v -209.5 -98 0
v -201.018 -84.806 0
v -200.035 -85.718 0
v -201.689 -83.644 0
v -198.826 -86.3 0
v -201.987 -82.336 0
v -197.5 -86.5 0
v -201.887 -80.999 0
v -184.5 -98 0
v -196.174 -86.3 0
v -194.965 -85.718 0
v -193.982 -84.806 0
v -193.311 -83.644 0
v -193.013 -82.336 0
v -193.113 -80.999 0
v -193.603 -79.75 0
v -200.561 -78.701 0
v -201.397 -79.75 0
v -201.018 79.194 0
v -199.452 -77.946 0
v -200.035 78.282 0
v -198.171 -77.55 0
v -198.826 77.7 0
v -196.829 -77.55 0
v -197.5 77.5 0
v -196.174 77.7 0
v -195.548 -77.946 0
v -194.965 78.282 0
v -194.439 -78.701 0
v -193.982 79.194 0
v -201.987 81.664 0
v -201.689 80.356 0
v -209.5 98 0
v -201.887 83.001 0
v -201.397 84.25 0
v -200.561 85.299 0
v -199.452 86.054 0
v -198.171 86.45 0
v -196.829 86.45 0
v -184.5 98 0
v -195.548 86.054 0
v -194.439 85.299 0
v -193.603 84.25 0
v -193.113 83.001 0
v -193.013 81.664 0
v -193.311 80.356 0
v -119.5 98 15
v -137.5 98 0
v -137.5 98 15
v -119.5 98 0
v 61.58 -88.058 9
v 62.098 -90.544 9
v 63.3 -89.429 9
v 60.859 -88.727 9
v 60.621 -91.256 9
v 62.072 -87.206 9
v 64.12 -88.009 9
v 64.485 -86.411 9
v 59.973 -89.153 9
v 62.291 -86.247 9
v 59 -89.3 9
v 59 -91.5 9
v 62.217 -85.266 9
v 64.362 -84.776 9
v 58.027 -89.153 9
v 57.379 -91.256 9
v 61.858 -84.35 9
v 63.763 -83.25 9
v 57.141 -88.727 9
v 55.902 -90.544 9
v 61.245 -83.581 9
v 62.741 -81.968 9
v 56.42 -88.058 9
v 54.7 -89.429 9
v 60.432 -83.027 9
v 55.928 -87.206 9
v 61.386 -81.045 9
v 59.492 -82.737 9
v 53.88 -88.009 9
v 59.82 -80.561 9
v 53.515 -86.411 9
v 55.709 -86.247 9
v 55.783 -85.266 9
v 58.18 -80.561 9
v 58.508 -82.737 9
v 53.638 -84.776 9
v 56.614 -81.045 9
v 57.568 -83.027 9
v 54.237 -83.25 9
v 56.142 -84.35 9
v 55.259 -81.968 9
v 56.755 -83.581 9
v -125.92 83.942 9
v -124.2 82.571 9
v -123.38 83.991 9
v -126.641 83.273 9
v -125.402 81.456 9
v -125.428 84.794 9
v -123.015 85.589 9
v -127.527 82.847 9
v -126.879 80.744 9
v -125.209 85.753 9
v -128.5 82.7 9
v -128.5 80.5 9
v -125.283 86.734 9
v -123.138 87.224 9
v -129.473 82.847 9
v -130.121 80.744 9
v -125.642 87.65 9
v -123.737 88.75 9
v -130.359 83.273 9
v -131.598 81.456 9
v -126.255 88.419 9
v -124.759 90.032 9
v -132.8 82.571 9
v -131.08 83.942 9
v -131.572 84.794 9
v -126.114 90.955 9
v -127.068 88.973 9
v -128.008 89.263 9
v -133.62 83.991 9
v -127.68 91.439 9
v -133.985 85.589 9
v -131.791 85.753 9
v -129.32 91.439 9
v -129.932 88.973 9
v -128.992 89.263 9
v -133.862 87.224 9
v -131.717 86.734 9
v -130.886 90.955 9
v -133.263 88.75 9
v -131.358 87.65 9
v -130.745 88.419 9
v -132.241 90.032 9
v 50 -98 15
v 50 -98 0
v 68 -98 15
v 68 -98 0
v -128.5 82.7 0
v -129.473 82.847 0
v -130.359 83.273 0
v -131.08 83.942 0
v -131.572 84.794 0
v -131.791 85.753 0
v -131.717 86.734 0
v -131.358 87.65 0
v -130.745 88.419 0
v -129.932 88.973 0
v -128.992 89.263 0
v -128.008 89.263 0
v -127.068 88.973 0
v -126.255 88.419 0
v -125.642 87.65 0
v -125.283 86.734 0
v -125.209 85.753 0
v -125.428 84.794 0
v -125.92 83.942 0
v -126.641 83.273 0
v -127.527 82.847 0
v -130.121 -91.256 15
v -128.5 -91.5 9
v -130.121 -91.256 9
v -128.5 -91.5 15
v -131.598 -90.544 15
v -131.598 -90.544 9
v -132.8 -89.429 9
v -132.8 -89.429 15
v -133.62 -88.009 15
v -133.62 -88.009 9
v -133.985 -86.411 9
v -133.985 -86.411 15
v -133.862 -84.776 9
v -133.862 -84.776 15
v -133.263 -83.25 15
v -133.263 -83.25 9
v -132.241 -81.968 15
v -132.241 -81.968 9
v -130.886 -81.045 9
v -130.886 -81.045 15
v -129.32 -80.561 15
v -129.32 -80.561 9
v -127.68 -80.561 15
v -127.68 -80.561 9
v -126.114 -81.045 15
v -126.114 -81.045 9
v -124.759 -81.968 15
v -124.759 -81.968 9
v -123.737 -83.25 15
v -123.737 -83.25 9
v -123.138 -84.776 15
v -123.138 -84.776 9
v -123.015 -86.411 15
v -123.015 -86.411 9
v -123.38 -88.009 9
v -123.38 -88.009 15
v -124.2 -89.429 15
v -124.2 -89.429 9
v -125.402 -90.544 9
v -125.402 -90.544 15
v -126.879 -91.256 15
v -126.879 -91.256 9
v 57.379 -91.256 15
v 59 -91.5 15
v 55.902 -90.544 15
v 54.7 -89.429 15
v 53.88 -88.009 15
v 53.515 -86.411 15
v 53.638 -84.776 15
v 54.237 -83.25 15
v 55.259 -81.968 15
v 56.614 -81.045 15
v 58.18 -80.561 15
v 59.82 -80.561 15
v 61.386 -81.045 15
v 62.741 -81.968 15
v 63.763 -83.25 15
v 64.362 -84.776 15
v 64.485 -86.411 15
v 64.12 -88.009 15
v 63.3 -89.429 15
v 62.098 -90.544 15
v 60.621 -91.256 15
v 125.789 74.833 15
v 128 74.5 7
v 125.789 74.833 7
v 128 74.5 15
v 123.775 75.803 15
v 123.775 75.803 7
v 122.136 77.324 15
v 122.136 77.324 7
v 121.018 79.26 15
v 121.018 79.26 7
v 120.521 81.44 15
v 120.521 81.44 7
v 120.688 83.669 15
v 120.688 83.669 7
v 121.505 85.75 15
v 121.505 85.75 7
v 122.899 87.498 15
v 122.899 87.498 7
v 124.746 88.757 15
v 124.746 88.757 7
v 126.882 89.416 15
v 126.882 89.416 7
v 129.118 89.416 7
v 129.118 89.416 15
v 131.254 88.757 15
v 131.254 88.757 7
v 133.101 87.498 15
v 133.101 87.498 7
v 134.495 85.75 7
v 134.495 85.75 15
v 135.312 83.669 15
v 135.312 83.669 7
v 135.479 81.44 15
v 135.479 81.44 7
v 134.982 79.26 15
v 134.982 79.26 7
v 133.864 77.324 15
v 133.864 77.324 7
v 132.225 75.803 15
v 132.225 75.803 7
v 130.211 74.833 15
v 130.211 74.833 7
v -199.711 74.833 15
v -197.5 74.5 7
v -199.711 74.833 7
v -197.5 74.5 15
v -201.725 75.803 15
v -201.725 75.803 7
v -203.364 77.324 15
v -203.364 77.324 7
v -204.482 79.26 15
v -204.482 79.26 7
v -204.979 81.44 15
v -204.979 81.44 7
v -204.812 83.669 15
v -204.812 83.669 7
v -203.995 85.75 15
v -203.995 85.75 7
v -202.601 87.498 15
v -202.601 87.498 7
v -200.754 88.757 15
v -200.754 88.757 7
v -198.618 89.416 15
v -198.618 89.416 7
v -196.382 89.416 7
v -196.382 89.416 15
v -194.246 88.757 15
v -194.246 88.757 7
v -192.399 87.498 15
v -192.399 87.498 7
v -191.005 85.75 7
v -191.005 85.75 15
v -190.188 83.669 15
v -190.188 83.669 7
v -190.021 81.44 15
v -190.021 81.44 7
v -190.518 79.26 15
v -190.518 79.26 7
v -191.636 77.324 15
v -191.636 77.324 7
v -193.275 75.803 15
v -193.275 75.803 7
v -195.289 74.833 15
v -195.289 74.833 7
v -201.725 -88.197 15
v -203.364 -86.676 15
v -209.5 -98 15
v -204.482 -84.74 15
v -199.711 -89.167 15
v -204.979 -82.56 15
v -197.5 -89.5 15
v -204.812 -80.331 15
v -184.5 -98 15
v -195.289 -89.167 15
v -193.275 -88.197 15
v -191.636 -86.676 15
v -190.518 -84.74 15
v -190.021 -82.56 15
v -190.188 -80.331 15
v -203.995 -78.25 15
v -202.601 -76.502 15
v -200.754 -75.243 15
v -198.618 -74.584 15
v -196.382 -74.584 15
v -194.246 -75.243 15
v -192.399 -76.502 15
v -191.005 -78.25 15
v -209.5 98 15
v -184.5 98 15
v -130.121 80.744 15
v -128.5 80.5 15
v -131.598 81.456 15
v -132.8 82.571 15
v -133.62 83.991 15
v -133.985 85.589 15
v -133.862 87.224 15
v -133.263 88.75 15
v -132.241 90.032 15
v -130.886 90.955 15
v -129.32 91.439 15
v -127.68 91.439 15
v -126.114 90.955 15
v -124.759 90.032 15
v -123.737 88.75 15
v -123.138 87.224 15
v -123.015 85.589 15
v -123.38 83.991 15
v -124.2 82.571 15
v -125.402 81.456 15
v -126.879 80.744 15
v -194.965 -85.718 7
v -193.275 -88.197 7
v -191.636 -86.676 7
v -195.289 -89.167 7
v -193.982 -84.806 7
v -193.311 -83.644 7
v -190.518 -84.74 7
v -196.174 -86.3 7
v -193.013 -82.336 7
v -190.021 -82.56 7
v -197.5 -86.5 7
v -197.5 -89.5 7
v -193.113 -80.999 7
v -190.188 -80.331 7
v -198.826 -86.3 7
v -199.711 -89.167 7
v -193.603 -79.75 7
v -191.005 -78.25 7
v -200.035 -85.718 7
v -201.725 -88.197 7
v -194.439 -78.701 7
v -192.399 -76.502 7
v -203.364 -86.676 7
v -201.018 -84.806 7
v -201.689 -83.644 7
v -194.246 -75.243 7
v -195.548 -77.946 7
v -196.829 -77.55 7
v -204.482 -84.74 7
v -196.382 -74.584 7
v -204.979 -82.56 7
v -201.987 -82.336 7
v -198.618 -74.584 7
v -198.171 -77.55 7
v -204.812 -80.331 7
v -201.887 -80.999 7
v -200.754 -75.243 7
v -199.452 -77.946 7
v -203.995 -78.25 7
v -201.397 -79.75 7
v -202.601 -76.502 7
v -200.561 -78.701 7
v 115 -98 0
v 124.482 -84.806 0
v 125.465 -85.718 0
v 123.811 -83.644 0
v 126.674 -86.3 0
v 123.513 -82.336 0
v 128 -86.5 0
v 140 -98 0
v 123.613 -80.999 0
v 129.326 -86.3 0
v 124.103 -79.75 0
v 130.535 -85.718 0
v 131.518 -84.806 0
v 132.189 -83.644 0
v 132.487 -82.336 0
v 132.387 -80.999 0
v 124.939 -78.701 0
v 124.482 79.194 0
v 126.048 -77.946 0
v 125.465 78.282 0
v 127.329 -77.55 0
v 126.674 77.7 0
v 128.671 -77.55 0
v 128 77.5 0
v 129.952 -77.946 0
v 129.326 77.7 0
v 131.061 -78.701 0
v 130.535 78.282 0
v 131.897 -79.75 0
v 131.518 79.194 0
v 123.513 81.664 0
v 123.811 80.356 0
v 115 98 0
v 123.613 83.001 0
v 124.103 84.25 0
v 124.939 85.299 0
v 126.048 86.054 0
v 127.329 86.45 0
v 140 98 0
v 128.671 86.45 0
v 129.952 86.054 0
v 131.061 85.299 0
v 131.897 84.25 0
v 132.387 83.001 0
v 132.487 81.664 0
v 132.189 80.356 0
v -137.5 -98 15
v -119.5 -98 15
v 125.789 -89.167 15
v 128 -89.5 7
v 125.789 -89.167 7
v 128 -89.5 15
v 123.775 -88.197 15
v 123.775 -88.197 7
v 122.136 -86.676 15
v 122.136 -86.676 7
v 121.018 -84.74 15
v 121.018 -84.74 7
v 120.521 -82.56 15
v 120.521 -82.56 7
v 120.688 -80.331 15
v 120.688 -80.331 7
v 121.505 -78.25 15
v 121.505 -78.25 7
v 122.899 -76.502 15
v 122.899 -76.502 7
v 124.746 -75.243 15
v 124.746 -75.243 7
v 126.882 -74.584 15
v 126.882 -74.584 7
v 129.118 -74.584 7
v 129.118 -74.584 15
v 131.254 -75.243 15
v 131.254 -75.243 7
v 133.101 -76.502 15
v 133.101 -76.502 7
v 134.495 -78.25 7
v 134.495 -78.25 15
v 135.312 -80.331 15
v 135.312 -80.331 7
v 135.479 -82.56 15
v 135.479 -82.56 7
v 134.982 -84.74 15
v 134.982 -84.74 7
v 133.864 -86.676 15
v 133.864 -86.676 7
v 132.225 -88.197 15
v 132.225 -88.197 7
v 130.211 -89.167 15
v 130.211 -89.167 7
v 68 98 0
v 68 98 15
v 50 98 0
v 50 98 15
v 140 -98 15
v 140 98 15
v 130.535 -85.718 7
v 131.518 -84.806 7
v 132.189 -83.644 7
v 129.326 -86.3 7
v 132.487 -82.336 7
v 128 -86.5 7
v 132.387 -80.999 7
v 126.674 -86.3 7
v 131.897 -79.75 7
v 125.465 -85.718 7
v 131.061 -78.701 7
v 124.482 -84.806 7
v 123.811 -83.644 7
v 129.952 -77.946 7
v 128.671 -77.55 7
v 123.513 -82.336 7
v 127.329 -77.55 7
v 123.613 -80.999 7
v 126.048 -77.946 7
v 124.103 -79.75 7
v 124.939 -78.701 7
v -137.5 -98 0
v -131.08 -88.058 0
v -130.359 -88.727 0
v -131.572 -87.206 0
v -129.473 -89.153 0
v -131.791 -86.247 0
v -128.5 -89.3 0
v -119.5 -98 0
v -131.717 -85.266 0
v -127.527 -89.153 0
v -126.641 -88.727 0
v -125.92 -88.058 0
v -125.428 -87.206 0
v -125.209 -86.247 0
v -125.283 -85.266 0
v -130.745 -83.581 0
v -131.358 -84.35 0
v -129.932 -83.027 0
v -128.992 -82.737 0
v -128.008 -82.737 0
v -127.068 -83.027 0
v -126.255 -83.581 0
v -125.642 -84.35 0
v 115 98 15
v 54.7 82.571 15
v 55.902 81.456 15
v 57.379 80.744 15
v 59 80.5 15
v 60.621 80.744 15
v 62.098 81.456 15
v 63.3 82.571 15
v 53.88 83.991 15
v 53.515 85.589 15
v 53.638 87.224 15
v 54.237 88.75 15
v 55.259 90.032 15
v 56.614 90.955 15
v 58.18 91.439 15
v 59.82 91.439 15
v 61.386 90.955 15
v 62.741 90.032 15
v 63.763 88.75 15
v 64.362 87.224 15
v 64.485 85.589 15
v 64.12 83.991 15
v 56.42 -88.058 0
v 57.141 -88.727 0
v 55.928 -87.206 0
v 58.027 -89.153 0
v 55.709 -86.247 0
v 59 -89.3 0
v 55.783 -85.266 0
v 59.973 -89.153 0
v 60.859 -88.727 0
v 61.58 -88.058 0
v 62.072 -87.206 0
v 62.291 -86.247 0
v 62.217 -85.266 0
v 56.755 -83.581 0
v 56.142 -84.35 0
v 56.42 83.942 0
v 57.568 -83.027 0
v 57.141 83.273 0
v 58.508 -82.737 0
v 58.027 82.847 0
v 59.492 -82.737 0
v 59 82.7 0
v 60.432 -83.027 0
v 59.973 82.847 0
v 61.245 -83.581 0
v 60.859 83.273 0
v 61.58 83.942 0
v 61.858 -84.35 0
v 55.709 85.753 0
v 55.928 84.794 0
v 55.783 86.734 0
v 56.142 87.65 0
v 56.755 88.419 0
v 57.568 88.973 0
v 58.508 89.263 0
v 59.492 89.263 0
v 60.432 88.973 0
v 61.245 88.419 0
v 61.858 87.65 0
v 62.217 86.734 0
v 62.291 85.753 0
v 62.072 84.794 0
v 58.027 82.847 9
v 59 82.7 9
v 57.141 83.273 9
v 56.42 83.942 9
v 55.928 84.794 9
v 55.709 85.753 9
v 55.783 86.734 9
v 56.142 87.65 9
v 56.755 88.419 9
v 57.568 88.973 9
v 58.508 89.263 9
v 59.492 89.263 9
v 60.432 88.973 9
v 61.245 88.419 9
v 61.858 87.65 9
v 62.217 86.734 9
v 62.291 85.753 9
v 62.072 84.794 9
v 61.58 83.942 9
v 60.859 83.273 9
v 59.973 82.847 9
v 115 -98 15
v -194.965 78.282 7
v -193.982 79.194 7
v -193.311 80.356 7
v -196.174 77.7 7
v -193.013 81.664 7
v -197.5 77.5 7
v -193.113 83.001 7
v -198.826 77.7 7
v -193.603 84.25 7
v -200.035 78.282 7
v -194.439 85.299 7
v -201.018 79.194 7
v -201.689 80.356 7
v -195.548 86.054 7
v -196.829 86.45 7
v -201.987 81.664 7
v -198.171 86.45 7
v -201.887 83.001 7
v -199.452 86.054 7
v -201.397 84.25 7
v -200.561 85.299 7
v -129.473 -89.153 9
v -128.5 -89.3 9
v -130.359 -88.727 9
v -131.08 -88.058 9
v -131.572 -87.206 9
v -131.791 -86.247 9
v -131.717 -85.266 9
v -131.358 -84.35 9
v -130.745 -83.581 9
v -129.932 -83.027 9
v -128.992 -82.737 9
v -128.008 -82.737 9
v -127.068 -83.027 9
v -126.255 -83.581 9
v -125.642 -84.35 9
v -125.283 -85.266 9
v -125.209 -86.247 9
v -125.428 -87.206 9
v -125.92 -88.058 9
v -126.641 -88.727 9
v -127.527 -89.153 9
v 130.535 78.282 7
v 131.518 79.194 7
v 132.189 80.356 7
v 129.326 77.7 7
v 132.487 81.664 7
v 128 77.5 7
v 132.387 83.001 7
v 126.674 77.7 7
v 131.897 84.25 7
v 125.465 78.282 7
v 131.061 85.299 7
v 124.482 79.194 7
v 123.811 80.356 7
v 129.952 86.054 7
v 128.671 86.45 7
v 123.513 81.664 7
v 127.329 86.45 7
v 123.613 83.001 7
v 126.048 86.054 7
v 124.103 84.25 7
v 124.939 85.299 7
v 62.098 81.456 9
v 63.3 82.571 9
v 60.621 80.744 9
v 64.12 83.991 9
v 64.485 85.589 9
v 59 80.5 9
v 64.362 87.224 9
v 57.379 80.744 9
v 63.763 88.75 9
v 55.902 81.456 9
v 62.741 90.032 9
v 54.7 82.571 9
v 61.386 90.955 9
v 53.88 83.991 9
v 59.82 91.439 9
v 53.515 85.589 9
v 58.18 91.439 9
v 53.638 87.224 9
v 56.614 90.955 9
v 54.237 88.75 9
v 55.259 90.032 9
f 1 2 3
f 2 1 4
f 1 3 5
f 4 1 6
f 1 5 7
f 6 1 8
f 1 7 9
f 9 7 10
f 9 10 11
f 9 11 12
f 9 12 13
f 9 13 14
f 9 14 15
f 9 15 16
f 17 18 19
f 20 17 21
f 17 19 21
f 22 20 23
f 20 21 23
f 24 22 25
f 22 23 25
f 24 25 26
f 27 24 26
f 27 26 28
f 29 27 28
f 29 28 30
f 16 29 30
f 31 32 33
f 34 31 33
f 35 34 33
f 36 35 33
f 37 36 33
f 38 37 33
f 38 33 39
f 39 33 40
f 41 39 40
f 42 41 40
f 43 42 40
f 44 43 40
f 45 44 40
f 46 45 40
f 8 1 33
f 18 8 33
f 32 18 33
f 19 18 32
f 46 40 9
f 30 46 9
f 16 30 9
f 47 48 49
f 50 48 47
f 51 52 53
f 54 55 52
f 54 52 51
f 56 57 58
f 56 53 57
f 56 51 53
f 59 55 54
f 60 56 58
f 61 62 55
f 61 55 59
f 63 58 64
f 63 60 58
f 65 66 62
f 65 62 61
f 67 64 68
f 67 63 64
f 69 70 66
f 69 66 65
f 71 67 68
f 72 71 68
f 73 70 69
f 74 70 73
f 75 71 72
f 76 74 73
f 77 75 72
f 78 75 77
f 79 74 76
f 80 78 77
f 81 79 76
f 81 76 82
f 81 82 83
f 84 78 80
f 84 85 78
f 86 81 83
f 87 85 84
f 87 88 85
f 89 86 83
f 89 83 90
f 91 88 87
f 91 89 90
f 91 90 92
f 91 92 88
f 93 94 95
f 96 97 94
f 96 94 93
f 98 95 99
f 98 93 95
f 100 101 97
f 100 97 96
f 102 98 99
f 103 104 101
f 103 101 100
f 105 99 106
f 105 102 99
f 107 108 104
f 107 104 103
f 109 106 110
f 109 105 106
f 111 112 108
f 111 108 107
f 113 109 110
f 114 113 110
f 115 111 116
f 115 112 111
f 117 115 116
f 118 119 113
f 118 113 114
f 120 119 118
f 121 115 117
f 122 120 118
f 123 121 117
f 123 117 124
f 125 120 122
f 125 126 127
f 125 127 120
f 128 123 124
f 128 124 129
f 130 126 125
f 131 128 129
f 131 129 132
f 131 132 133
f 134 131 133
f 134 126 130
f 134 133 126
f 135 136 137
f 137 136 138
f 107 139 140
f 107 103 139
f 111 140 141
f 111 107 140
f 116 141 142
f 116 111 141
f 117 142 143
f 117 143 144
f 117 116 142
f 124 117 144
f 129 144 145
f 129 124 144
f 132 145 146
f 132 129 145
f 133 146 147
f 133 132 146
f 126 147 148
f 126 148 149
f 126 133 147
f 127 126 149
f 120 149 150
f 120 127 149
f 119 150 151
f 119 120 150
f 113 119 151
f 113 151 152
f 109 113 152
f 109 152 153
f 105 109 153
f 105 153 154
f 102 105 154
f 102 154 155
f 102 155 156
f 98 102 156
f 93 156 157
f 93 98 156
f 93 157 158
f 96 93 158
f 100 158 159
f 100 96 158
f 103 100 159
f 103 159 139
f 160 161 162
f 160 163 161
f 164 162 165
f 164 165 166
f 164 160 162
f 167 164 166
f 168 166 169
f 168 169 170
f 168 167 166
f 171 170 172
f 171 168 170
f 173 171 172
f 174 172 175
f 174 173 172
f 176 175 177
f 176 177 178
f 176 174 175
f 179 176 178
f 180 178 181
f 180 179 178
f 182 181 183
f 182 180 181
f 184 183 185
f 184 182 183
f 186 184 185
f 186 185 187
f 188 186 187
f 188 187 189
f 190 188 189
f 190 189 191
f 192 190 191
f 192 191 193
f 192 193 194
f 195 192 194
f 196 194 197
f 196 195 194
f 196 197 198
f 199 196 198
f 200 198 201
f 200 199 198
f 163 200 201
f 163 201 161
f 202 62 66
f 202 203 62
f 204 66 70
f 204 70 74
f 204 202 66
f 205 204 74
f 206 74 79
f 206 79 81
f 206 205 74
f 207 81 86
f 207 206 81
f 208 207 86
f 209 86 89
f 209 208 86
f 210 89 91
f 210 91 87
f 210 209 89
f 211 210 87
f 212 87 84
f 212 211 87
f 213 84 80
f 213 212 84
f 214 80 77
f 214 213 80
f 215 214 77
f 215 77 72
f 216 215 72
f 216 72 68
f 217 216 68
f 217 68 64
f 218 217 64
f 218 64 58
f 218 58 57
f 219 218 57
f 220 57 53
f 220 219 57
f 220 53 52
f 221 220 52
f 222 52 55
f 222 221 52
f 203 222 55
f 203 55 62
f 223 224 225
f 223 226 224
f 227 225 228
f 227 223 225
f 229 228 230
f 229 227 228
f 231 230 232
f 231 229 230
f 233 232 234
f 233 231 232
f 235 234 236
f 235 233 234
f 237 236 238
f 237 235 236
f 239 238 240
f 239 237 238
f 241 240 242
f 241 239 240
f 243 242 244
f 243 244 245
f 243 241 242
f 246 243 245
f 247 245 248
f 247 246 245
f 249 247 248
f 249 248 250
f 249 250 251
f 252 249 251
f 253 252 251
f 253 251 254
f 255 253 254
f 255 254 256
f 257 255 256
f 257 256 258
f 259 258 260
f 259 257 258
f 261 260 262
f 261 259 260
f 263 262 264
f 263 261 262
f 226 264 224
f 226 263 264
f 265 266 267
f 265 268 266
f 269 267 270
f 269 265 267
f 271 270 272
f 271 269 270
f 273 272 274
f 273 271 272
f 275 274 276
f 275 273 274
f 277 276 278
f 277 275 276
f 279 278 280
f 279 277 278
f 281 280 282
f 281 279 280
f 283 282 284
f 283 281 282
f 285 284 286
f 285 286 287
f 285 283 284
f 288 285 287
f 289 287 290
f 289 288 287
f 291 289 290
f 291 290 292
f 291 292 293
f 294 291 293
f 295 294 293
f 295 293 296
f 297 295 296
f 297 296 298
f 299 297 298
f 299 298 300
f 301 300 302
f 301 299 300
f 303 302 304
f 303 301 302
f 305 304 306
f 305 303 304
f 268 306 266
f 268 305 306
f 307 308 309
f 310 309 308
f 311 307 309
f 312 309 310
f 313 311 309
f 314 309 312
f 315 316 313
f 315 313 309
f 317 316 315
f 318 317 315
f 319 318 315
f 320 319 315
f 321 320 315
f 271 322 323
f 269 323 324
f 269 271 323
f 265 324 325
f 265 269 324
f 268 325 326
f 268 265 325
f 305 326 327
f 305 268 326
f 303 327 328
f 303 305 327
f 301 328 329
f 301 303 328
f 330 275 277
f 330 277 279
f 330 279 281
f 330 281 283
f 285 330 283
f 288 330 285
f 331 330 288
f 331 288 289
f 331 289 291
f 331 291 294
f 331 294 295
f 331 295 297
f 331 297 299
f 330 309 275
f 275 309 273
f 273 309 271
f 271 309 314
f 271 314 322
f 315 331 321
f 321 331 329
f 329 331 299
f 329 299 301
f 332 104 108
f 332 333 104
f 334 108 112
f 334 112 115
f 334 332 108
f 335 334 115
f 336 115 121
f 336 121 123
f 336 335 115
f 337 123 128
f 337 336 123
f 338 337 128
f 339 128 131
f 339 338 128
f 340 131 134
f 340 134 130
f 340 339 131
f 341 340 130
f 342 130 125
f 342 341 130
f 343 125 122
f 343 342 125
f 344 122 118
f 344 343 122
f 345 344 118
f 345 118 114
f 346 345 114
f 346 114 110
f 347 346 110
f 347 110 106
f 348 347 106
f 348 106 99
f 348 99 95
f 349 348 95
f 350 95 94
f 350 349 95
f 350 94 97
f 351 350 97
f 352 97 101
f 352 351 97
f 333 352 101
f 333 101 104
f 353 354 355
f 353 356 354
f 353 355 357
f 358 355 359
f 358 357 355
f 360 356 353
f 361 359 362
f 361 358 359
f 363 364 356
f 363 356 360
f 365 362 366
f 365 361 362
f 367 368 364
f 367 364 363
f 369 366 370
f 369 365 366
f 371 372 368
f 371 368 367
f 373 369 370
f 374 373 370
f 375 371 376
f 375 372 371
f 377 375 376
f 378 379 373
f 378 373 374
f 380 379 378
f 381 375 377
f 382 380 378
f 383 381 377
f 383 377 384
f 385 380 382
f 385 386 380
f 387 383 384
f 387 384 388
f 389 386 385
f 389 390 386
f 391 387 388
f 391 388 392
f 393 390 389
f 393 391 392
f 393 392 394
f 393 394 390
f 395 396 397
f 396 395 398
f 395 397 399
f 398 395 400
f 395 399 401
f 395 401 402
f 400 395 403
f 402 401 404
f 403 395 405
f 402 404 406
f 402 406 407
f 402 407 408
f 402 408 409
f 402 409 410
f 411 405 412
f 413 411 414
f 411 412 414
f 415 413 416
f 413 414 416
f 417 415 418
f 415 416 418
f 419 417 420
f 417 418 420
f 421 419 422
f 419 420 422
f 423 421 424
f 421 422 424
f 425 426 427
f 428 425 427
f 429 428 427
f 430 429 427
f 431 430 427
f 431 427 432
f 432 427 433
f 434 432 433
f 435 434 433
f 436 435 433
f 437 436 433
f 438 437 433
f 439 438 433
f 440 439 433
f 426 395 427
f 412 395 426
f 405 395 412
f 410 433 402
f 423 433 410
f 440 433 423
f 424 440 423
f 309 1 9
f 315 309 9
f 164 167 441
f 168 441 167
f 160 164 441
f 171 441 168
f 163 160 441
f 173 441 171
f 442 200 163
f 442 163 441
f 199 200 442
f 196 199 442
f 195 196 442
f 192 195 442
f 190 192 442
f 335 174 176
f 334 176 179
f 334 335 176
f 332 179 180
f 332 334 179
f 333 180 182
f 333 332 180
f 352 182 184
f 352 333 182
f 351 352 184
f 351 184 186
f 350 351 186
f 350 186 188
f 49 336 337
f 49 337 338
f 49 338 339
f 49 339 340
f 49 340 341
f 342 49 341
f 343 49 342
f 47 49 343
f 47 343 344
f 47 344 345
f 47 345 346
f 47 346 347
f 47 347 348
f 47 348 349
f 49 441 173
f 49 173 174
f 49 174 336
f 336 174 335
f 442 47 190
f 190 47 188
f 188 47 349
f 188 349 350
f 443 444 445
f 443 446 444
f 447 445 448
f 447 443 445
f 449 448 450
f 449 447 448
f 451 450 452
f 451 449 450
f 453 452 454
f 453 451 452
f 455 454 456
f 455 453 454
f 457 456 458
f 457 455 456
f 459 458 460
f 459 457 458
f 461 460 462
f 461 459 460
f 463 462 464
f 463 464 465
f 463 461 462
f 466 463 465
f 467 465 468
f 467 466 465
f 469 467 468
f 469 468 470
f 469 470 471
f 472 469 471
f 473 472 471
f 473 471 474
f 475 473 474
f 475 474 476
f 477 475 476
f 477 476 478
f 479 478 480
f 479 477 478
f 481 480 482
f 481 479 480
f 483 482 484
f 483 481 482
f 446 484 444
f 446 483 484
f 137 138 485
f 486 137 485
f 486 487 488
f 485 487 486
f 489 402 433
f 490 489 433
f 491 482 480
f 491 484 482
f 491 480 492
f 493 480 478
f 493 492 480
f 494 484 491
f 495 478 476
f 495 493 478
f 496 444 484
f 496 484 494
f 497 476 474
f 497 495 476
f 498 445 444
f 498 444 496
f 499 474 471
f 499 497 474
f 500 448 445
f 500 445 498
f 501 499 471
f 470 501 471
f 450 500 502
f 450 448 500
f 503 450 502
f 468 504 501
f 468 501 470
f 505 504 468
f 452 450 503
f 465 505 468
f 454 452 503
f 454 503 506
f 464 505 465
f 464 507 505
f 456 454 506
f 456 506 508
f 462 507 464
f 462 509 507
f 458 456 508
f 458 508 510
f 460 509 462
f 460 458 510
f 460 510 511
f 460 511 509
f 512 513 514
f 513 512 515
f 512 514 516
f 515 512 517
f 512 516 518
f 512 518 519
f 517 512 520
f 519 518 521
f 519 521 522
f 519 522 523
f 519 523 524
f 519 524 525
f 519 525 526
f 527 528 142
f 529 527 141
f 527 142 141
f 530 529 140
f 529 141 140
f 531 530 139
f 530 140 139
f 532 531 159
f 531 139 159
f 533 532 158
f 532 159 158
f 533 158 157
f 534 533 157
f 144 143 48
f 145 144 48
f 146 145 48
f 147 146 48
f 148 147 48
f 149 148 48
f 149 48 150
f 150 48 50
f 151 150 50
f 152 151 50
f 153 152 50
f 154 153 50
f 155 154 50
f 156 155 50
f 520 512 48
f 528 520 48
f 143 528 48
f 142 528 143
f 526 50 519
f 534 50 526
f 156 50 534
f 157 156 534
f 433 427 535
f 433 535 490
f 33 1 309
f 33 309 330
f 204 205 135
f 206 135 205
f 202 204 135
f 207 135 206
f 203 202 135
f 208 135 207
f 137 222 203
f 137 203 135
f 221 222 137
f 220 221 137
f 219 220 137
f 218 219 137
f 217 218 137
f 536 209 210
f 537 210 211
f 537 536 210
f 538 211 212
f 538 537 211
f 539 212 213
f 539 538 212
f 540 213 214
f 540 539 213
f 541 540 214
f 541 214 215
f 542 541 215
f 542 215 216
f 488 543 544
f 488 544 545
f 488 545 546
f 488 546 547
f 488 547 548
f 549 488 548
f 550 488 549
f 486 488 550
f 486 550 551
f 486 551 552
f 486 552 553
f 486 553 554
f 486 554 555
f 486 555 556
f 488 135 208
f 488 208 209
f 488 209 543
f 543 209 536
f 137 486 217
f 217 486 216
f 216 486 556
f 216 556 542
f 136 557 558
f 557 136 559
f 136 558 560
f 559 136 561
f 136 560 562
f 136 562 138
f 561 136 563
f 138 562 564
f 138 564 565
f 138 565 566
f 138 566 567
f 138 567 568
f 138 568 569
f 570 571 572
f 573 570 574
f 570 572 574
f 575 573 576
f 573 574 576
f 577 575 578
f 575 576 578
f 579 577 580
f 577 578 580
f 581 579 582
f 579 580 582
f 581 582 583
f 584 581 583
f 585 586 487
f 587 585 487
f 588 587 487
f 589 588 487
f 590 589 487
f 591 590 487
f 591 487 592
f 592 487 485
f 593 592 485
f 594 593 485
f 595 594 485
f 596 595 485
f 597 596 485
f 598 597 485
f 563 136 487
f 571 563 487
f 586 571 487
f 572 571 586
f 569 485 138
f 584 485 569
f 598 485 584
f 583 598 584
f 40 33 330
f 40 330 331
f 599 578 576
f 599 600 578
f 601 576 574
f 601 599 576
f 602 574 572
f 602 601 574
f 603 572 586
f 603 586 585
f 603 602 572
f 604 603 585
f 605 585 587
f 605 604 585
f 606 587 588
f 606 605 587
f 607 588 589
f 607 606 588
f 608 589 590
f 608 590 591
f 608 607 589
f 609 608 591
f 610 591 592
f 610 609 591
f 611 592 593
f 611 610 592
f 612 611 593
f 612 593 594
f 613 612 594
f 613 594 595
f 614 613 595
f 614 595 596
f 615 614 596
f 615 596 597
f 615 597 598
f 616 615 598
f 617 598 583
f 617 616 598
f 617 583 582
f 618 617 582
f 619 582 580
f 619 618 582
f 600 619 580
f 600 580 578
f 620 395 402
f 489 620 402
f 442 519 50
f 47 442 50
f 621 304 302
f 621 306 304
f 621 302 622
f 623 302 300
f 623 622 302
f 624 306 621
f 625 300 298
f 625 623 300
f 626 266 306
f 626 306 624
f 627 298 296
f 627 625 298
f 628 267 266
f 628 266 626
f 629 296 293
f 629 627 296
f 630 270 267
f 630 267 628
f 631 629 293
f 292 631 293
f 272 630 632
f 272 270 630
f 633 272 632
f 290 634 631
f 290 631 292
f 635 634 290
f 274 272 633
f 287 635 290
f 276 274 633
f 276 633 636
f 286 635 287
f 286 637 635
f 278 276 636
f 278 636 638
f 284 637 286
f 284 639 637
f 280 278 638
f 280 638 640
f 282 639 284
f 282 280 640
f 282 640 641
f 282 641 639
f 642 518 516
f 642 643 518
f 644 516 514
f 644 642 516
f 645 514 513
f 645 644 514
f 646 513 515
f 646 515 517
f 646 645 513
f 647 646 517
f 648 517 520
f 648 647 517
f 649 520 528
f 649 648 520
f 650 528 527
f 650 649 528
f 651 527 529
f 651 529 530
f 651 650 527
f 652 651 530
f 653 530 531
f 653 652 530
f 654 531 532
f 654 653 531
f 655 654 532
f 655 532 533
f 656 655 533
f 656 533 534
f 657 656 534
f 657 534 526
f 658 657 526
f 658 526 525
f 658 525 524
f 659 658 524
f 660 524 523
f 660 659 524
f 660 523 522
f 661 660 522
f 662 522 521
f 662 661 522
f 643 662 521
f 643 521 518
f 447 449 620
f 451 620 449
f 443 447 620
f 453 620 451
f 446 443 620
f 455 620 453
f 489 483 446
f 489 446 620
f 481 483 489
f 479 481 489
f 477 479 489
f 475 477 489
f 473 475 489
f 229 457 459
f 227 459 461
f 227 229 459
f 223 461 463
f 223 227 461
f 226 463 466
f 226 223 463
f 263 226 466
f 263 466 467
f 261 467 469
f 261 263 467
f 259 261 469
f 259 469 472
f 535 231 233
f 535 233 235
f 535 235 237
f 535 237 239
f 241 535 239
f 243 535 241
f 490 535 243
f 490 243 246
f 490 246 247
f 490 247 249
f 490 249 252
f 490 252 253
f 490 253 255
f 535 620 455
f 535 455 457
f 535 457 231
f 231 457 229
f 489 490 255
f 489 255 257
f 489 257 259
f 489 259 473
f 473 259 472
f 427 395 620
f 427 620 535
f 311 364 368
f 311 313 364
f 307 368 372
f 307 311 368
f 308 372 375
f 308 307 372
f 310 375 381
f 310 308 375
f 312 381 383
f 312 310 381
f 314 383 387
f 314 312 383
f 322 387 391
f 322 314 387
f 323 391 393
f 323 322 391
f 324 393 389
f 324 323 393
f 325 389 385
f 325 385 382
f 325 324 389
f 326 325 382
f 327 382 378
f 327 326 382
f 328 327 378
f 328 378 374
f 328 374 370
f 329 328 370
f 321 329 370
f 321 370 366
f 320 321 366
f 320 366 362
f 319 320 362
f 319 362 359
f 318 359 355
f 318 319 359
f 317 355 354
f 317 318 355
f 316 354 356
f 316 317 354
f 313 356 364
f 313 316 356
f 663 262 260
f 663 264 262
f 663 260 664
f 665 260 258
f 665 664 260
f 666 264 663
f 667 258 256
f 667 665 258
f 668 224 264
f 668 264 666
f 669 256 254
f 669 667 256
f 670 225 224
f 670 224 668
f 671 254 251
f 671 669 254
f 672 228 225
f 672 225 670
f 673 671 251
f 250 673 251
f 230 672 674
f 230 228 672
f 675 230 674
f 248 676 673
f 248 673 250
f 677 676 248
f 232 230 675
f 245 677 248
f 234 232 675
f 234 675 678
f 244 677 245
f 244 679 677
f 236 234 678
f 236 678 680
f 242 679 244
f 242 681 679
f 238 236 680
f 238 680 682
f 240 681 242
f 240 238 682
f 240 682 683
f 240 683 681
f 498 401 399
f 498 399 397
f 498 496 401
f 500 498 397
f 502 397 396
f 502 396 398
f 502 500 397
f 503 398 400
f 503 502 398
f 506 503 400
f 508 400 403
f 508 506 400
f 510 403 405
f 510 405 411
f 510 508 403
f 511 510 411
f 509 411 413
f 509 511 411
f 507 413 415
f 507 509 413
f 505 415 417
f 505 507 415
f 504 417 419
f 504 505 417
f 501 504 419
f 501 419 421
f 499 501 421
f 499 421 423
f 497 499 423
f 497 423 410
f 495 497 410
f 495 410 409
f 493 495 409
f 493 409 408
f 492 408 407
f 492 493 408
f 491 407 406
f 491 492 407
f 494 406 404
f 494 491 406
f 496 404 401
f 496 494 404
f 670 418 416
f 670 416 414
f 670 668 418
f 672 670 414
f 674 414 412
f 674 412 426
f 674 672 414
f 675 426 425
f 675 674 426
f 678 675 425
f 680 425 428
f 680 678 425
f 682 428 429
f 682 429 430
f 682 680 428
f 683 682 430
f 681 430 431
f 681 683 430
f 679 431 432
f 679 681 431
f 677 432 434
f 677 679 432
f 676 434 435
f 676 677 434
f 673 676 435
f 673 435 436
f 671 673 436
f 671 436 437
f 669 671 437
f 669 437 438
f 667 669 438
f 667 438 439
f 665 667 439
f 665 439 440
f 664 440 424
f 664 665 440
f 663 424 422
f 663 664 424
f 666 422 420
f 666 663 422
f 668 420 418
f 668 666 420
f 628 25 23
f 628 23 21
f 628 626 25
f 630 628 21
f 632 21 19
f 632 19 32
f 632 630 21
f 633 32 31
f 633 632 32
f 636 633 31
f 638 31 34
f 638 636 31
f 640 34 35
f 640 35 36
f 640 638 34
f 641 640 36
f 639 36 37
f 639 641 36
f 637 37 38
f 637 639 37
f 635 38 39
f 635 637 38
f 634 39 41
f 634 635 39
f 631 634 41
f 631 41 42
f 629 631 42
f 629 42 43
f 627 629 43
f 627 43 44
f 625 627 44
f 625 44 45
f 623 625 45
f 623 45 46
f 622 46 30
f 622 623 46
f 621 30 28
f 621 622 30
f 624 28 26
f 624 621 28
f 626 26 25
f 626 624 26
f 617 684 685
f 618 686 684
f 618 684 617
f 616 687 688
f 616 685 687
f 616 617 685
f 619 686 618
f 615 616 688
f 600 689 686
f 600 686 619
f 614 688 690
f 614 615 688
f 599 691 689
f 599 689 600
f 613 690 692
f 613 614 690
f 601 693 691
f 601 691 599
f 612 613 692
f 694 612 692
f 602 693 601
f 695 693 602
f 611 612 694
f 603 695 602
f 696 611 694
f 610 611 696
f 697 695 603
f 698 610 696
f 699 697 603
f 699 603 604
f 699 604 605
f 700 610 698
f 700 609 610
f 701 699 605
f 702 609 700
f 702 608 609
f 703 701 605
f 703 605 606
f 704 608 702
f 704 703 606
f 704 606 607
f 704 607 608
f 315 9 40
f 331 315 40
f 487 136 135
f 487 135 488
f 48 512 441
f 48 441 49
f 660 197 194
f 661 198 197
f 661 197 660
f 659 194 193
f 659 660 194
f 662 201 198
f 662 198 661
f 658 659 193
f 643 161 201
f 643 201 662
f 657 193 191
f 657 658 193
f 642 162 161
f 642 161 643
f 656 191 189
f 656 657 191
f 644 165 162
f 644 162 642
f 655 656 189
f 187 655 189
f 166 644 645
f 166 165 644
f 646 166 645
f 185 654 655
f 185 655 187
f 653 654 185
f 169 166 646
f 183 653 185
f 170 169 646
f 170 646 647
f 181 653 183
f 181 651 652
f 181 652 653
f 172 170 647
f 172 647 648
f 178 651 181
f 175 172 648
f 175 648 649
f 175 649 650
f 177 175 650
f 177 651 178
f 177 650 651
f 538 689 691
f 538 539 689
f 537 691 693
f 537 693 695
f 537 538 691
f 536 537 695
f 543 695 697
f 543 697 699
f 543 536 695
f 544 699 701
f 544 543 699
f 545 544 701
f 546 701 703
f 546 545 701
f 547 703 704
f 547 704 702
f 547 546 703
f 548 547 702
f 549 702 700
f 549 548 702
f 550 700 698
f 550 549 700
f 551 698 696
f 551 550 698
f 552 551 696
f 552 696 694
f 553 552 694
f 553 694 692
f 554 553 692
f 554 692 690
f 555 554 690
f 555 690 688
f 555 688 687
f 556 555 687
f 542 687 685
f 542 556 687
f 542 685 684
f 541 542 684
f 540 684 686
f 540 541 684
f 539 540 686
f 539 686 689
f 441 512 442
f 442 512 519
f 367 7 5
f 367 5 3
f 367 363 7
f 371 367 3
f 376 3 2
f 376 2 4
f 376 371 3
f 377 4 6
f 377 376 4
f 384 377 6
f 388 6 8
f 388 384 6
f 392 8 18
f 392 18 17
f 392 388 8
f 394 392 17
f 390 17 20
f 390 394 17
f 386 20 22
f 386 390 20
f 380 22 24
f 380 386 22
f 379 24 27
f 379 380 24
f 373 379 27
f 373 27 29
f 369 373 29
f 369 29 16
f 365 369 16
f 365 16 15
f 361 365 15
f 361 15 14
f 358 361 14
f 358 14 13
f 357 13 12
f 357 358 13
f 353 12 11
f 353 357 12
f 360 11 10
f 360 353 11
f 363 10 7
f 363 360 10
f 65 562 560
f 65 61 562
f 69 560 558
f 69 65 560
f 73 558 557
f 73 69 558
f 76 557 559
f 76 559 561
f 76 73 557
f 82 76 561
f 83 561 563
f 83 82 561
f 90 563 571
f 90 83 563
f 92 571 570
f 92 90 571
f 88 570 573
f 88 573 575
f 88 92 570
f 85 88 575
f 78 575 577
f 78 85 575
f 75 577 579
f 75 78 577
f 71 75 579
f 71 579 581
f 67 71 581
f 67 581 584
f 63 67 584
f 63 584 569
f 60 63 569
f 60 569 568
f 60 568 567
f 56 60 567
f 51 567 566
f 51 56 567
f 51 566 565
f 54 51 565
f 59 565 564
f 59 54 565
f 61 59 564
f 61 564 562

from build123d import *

# Parameters (mm, degrees)
SKETCH1_W                     = 18
SKETCH1_H                     = 196
BOSS_EXTRUDE1_DEPTH           = 15
SKETCH1_W_2                   = 25
BOSS_EXTRUDE1_2_DEPTH         = 15
BOSS_EXTRUDE1_3_DEPTH         = 15
BOSS_EXTRUDE1_4_DEPTH         = 15
CBORE_FOR_M6_SHCS1_AT_2_COUNT = 2
CBORE_FOR_M6_SHCS1_AT_2_PITCH = 172
CBORE_FOR_M6_SHCS2_AT_2_COUNT = 2
CBORE_FOR_M6_SHCS2_AT_2_PITCH = 172
CBORE_FOR_M8_SHCS2_AT_2_COUNT = 2
CBORE_FOR_M8_SHCS2_AT_2_PITCH = 164
CBORE_FOR_M8_SHCS3_AT_2_COUNT = 2
CBORE_FOR_M8_SHCS3_AT_2_PITCH = 164


with BuildPart() as part:
    # Sketch1 → Boss-Extrude1 (new body)
    with BuildSketch(Plane.XY):
        with Locations((-128.5, 0)):
            Rectangle(SKETCH1_W, SKETCH1_H)
    extrude(amount=BOSS_EXTRUDE1_DEPTH)

    # Sketch5 → CBORE for M6 SHCS2 (revolve, cut)
    with BuildSketch(Plane(origin=(-128.5, 86, 15), x_dir=(0, -1, 0), z_dir=(1, 0, 0))):
        Polygon((0, 0), (0, 15), (3.3, 15), (3.3, 6), (5.5, 6), (5.5, 0), align=None)
    cbore_for_m6_shcs2 = revolve(axis=Axis((-128.5, 86, 21.35), (0, 0, -1)), mode=Mode.SUBTRACT)

    # CBORE for M6 SHCS2 at 2: CBORE for M6 SHCS2 ×2
    with Locations(*[(0, -i * CBORE_FOR_M6_SHCS2_AT_2_PITCH, 0) for i in range(1, CBORE_FOR_M6_SHCS2_AT_2_COUNT)]):
        add(cbore_for_m6_shcs2, mode=Mode.SUBTRACT)


with BuildPart() as body_2:
    # Sketch1 → Boss-Extrude1 2 (new body)
    with BuildSketch(Plane.XY):
        with Locations((127.5, 0)):
            Rectangle(SKETCH1_W_2, SKETCH1_H)
    extrude(amount=BOSS_EXTRUDE1_2_DEPTH)

    # Sketch7 → CBORE for M8 SHCS2 (revolve, cut)
    with BuildSketch(Plane(origin=(128, -82, 15), x_dir=(0, -1, 0), z_dir=(1, 0, 0))):
        Polygon((0, 0), (0, 15), (4.5, 15), (4.5, 8), (7.5, 8), (7.5, 0), align=None)
    cbore_for_m8_shcs2 = revolve(axis=Axis((128, -82, 21.35), (0, 0, -1)), mode=Mode.SUBTRACT)

    # CBORE for M8 SHCS2 at 2: CBORE for M8 SHCS2 ×2
    with Locations(*[(0, i * CBORE_FOR_M8_SHCS2_AT_2_PITCH, 0) for i in range(1, CBORE_FOR_M8_SHCS2_AT_2_COUNT)]):
        add(cbore_for_m8_shcs2, mode=Mode.SUBTRACT)


with BuildPart() as body_3:
    # Sketch1 → Boss-Extrude1 3 (new body)
    with BuildSketch(Plane.XY):
        with Locations((-197, 0)):
            Rectangle(SKETCH1_W_2, SKETCH1_H)
    extrude(amount=BOSS_EXTRUDE1_3_DEPTH)

    # Sketch9 → CBORE for M8 SHCS3 (revolve, cut)
    with BuildSketch(Plane(origin=(-197.5, 82, 15), x_dir=(0, -1, 0), z_dir=(1, 0, 0))):
        Polygon((0, 0), (0, 15), (4.5, 15), (4.5, 8), (7.5, 8), (7.5, 0), align=None)
    cbore_for_m8_shcs3 = revolve(axis=Axis((-197.5, 82, 21.35), (0, 0, -1)), mode=Mode.SUBTRACT)

    # CBORE for M8 SHCS3 at 2: CBORE for M8 SHCS3 ×2
    with Locations(*[(0, -i * CBORE_FOR_M8_SHCS3_AT_2_PITCH, 0) for i in range(1, CBORE_FOR_M8_SHCS3_AT_2_COUNT)]):
        add(cbore_for_m8_shcs3, mode=Mode.SUBTRACT)


with BuildPart() as body_4:
    # Sketch1 → Boss-Extrude1 4 (new body)
    with BuildSketch(Plane.XY):
        with Locations((59, 0)):
            Rectangle(SKETCH1_W, SKETCH1_H)
    extrude(amount=BOSS_EXTRUDE1_4_DEPTH)

    # Sketch3 → CBORE for M6 SHCS1 (revolve, cut)
    with BuildSketch(Plane(origin=(59, 86, 15), x_dir=(0, -1, 0), z_dir=(1, 0, 0))):
        Polygon((0, 0), (0, 15), (3.3, 15), (3.3, 6), (5.5, 6), (5.5, 0), align=None)
    cbore_for_m6_shcs1 = revolve(axis=Axis((59, 86, 21.35), (0, 0, -1)), mode=Mode.SUBTRACT)

    # CBORE for M6 SHCS1 at 2: CBORE for M6 SHCS1 ×2
    with Locations(*[(0, -i * CBORE_FOR_M6_SHCS1_AT_2_PITCH, 0) for i in range(1, CBORE_FOR_M6_SHCS1_AT_2_COUNT)]):
        add(cbore_for_m6_shcs1, mode=Mode.SUBTRACT)


solid = Compound([part.part, body_2.part, body_3.part, body_4.part])
